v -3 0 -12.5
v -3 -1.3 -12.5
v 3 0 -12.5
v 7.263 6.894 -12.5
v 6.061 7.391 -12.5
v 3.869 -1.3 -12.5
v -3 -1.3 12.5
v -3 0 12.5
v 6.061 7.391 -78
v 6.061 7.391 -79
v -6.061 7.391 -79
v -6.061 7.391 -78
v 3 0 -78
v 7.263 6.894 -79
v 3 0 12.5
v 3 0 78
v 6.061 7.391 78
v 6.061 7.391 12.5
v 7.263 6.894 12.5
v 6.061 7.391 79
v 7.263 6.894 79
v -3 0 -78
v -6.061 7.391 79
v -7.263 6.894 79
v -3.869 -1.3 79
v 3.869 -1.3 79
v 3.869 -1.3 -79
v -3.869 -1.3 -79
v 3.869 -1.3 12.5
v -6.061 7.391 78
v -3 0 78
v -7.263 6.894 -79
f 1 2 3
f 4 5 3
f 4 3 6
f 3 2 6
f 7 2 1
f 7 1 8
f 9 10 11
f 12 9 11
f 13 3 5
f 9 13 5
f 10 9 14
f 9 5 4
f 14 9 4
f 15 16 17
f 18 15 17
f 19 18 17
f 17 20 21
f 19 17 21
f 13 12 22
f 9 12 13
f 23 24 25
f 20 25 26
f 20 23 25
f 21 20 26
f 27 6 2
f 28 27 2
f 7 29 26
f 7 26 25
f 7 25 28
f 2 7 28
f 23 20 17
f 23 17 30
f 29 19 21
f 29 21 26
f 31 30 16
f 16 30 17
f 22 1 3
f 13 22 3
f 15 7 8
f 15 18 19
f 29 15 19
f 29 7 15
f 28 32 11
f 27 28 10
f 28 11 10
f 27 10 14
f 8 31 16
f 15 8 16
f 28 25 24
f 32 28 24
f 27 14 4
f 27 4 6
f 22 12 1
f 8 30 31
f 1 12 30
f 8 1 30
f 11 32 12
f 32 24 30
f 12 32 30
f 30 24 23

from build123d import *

# Parameters (mm, degrees)
RESSALTO_EXTRUS_O1_DEPTH = 79
RESSALTO_EXTRUS_O2_DEPTH = 1
ESBO_O4_W                = 23.972124634
ESBO_O4_H                = 25
CORTE_EXTRUS_O1_DEPTH    = 80.807757613


with BuildPart() as part:
    # Esboço1 → Ressalto-extrusão1 (new, symmetric)
    with BuildSketch(Plane.XY):
        Polygon((-3, 0), (3, 0), (6.061467459, 7.39103626), (7.262510851, 6.893547798), (3.868632229, -1.3), (-3.868632229, -1.3), (-7.262510851, 6.893547798), (-6.061467459, 7.39103626), align=None)
    extrude(amount=RESSALTO_EXTRUS_O1_DEPTH, both=True)

    # Esboço2 → Ressalto-extrusão2 (add)
    with BuildSketch(Plane(origin=(0, 0, -79), x_dir=(-1, 0, 0), z_dir=(0, 0, -1))):
        Polygon((-6.061467459, 7.39103626), (6.061467459, 7.39103626), (7.262510851, 6.893547798), (3.868632229, -1.3), (-3.868632229, -1.3), (-7.262510851, 6.893547798), align=None)
    ressalto_extrus_o2 = extrude(amount=-RESSALTO_EXTRUS_O2_DEPTH)

    # Espelhar1: Ressalto-extrusão2 across plane
    add(ressalto_extrus_o2.mirror(Plane.XY))

    # Esboço4 → Corte-extrusão1 (cut, through all)
    with BuildSketch(Plane.XZ.offset(1.3)):
        with Locations((8.986062317, 0)):
            Rectangle(ESBO_O4_W, ESBO_O4_H)
    extrude(amount=-CORTE_EXTRUS_O1_DEPTH, mode=Mode.SUBTRACT)


solid = part.part
